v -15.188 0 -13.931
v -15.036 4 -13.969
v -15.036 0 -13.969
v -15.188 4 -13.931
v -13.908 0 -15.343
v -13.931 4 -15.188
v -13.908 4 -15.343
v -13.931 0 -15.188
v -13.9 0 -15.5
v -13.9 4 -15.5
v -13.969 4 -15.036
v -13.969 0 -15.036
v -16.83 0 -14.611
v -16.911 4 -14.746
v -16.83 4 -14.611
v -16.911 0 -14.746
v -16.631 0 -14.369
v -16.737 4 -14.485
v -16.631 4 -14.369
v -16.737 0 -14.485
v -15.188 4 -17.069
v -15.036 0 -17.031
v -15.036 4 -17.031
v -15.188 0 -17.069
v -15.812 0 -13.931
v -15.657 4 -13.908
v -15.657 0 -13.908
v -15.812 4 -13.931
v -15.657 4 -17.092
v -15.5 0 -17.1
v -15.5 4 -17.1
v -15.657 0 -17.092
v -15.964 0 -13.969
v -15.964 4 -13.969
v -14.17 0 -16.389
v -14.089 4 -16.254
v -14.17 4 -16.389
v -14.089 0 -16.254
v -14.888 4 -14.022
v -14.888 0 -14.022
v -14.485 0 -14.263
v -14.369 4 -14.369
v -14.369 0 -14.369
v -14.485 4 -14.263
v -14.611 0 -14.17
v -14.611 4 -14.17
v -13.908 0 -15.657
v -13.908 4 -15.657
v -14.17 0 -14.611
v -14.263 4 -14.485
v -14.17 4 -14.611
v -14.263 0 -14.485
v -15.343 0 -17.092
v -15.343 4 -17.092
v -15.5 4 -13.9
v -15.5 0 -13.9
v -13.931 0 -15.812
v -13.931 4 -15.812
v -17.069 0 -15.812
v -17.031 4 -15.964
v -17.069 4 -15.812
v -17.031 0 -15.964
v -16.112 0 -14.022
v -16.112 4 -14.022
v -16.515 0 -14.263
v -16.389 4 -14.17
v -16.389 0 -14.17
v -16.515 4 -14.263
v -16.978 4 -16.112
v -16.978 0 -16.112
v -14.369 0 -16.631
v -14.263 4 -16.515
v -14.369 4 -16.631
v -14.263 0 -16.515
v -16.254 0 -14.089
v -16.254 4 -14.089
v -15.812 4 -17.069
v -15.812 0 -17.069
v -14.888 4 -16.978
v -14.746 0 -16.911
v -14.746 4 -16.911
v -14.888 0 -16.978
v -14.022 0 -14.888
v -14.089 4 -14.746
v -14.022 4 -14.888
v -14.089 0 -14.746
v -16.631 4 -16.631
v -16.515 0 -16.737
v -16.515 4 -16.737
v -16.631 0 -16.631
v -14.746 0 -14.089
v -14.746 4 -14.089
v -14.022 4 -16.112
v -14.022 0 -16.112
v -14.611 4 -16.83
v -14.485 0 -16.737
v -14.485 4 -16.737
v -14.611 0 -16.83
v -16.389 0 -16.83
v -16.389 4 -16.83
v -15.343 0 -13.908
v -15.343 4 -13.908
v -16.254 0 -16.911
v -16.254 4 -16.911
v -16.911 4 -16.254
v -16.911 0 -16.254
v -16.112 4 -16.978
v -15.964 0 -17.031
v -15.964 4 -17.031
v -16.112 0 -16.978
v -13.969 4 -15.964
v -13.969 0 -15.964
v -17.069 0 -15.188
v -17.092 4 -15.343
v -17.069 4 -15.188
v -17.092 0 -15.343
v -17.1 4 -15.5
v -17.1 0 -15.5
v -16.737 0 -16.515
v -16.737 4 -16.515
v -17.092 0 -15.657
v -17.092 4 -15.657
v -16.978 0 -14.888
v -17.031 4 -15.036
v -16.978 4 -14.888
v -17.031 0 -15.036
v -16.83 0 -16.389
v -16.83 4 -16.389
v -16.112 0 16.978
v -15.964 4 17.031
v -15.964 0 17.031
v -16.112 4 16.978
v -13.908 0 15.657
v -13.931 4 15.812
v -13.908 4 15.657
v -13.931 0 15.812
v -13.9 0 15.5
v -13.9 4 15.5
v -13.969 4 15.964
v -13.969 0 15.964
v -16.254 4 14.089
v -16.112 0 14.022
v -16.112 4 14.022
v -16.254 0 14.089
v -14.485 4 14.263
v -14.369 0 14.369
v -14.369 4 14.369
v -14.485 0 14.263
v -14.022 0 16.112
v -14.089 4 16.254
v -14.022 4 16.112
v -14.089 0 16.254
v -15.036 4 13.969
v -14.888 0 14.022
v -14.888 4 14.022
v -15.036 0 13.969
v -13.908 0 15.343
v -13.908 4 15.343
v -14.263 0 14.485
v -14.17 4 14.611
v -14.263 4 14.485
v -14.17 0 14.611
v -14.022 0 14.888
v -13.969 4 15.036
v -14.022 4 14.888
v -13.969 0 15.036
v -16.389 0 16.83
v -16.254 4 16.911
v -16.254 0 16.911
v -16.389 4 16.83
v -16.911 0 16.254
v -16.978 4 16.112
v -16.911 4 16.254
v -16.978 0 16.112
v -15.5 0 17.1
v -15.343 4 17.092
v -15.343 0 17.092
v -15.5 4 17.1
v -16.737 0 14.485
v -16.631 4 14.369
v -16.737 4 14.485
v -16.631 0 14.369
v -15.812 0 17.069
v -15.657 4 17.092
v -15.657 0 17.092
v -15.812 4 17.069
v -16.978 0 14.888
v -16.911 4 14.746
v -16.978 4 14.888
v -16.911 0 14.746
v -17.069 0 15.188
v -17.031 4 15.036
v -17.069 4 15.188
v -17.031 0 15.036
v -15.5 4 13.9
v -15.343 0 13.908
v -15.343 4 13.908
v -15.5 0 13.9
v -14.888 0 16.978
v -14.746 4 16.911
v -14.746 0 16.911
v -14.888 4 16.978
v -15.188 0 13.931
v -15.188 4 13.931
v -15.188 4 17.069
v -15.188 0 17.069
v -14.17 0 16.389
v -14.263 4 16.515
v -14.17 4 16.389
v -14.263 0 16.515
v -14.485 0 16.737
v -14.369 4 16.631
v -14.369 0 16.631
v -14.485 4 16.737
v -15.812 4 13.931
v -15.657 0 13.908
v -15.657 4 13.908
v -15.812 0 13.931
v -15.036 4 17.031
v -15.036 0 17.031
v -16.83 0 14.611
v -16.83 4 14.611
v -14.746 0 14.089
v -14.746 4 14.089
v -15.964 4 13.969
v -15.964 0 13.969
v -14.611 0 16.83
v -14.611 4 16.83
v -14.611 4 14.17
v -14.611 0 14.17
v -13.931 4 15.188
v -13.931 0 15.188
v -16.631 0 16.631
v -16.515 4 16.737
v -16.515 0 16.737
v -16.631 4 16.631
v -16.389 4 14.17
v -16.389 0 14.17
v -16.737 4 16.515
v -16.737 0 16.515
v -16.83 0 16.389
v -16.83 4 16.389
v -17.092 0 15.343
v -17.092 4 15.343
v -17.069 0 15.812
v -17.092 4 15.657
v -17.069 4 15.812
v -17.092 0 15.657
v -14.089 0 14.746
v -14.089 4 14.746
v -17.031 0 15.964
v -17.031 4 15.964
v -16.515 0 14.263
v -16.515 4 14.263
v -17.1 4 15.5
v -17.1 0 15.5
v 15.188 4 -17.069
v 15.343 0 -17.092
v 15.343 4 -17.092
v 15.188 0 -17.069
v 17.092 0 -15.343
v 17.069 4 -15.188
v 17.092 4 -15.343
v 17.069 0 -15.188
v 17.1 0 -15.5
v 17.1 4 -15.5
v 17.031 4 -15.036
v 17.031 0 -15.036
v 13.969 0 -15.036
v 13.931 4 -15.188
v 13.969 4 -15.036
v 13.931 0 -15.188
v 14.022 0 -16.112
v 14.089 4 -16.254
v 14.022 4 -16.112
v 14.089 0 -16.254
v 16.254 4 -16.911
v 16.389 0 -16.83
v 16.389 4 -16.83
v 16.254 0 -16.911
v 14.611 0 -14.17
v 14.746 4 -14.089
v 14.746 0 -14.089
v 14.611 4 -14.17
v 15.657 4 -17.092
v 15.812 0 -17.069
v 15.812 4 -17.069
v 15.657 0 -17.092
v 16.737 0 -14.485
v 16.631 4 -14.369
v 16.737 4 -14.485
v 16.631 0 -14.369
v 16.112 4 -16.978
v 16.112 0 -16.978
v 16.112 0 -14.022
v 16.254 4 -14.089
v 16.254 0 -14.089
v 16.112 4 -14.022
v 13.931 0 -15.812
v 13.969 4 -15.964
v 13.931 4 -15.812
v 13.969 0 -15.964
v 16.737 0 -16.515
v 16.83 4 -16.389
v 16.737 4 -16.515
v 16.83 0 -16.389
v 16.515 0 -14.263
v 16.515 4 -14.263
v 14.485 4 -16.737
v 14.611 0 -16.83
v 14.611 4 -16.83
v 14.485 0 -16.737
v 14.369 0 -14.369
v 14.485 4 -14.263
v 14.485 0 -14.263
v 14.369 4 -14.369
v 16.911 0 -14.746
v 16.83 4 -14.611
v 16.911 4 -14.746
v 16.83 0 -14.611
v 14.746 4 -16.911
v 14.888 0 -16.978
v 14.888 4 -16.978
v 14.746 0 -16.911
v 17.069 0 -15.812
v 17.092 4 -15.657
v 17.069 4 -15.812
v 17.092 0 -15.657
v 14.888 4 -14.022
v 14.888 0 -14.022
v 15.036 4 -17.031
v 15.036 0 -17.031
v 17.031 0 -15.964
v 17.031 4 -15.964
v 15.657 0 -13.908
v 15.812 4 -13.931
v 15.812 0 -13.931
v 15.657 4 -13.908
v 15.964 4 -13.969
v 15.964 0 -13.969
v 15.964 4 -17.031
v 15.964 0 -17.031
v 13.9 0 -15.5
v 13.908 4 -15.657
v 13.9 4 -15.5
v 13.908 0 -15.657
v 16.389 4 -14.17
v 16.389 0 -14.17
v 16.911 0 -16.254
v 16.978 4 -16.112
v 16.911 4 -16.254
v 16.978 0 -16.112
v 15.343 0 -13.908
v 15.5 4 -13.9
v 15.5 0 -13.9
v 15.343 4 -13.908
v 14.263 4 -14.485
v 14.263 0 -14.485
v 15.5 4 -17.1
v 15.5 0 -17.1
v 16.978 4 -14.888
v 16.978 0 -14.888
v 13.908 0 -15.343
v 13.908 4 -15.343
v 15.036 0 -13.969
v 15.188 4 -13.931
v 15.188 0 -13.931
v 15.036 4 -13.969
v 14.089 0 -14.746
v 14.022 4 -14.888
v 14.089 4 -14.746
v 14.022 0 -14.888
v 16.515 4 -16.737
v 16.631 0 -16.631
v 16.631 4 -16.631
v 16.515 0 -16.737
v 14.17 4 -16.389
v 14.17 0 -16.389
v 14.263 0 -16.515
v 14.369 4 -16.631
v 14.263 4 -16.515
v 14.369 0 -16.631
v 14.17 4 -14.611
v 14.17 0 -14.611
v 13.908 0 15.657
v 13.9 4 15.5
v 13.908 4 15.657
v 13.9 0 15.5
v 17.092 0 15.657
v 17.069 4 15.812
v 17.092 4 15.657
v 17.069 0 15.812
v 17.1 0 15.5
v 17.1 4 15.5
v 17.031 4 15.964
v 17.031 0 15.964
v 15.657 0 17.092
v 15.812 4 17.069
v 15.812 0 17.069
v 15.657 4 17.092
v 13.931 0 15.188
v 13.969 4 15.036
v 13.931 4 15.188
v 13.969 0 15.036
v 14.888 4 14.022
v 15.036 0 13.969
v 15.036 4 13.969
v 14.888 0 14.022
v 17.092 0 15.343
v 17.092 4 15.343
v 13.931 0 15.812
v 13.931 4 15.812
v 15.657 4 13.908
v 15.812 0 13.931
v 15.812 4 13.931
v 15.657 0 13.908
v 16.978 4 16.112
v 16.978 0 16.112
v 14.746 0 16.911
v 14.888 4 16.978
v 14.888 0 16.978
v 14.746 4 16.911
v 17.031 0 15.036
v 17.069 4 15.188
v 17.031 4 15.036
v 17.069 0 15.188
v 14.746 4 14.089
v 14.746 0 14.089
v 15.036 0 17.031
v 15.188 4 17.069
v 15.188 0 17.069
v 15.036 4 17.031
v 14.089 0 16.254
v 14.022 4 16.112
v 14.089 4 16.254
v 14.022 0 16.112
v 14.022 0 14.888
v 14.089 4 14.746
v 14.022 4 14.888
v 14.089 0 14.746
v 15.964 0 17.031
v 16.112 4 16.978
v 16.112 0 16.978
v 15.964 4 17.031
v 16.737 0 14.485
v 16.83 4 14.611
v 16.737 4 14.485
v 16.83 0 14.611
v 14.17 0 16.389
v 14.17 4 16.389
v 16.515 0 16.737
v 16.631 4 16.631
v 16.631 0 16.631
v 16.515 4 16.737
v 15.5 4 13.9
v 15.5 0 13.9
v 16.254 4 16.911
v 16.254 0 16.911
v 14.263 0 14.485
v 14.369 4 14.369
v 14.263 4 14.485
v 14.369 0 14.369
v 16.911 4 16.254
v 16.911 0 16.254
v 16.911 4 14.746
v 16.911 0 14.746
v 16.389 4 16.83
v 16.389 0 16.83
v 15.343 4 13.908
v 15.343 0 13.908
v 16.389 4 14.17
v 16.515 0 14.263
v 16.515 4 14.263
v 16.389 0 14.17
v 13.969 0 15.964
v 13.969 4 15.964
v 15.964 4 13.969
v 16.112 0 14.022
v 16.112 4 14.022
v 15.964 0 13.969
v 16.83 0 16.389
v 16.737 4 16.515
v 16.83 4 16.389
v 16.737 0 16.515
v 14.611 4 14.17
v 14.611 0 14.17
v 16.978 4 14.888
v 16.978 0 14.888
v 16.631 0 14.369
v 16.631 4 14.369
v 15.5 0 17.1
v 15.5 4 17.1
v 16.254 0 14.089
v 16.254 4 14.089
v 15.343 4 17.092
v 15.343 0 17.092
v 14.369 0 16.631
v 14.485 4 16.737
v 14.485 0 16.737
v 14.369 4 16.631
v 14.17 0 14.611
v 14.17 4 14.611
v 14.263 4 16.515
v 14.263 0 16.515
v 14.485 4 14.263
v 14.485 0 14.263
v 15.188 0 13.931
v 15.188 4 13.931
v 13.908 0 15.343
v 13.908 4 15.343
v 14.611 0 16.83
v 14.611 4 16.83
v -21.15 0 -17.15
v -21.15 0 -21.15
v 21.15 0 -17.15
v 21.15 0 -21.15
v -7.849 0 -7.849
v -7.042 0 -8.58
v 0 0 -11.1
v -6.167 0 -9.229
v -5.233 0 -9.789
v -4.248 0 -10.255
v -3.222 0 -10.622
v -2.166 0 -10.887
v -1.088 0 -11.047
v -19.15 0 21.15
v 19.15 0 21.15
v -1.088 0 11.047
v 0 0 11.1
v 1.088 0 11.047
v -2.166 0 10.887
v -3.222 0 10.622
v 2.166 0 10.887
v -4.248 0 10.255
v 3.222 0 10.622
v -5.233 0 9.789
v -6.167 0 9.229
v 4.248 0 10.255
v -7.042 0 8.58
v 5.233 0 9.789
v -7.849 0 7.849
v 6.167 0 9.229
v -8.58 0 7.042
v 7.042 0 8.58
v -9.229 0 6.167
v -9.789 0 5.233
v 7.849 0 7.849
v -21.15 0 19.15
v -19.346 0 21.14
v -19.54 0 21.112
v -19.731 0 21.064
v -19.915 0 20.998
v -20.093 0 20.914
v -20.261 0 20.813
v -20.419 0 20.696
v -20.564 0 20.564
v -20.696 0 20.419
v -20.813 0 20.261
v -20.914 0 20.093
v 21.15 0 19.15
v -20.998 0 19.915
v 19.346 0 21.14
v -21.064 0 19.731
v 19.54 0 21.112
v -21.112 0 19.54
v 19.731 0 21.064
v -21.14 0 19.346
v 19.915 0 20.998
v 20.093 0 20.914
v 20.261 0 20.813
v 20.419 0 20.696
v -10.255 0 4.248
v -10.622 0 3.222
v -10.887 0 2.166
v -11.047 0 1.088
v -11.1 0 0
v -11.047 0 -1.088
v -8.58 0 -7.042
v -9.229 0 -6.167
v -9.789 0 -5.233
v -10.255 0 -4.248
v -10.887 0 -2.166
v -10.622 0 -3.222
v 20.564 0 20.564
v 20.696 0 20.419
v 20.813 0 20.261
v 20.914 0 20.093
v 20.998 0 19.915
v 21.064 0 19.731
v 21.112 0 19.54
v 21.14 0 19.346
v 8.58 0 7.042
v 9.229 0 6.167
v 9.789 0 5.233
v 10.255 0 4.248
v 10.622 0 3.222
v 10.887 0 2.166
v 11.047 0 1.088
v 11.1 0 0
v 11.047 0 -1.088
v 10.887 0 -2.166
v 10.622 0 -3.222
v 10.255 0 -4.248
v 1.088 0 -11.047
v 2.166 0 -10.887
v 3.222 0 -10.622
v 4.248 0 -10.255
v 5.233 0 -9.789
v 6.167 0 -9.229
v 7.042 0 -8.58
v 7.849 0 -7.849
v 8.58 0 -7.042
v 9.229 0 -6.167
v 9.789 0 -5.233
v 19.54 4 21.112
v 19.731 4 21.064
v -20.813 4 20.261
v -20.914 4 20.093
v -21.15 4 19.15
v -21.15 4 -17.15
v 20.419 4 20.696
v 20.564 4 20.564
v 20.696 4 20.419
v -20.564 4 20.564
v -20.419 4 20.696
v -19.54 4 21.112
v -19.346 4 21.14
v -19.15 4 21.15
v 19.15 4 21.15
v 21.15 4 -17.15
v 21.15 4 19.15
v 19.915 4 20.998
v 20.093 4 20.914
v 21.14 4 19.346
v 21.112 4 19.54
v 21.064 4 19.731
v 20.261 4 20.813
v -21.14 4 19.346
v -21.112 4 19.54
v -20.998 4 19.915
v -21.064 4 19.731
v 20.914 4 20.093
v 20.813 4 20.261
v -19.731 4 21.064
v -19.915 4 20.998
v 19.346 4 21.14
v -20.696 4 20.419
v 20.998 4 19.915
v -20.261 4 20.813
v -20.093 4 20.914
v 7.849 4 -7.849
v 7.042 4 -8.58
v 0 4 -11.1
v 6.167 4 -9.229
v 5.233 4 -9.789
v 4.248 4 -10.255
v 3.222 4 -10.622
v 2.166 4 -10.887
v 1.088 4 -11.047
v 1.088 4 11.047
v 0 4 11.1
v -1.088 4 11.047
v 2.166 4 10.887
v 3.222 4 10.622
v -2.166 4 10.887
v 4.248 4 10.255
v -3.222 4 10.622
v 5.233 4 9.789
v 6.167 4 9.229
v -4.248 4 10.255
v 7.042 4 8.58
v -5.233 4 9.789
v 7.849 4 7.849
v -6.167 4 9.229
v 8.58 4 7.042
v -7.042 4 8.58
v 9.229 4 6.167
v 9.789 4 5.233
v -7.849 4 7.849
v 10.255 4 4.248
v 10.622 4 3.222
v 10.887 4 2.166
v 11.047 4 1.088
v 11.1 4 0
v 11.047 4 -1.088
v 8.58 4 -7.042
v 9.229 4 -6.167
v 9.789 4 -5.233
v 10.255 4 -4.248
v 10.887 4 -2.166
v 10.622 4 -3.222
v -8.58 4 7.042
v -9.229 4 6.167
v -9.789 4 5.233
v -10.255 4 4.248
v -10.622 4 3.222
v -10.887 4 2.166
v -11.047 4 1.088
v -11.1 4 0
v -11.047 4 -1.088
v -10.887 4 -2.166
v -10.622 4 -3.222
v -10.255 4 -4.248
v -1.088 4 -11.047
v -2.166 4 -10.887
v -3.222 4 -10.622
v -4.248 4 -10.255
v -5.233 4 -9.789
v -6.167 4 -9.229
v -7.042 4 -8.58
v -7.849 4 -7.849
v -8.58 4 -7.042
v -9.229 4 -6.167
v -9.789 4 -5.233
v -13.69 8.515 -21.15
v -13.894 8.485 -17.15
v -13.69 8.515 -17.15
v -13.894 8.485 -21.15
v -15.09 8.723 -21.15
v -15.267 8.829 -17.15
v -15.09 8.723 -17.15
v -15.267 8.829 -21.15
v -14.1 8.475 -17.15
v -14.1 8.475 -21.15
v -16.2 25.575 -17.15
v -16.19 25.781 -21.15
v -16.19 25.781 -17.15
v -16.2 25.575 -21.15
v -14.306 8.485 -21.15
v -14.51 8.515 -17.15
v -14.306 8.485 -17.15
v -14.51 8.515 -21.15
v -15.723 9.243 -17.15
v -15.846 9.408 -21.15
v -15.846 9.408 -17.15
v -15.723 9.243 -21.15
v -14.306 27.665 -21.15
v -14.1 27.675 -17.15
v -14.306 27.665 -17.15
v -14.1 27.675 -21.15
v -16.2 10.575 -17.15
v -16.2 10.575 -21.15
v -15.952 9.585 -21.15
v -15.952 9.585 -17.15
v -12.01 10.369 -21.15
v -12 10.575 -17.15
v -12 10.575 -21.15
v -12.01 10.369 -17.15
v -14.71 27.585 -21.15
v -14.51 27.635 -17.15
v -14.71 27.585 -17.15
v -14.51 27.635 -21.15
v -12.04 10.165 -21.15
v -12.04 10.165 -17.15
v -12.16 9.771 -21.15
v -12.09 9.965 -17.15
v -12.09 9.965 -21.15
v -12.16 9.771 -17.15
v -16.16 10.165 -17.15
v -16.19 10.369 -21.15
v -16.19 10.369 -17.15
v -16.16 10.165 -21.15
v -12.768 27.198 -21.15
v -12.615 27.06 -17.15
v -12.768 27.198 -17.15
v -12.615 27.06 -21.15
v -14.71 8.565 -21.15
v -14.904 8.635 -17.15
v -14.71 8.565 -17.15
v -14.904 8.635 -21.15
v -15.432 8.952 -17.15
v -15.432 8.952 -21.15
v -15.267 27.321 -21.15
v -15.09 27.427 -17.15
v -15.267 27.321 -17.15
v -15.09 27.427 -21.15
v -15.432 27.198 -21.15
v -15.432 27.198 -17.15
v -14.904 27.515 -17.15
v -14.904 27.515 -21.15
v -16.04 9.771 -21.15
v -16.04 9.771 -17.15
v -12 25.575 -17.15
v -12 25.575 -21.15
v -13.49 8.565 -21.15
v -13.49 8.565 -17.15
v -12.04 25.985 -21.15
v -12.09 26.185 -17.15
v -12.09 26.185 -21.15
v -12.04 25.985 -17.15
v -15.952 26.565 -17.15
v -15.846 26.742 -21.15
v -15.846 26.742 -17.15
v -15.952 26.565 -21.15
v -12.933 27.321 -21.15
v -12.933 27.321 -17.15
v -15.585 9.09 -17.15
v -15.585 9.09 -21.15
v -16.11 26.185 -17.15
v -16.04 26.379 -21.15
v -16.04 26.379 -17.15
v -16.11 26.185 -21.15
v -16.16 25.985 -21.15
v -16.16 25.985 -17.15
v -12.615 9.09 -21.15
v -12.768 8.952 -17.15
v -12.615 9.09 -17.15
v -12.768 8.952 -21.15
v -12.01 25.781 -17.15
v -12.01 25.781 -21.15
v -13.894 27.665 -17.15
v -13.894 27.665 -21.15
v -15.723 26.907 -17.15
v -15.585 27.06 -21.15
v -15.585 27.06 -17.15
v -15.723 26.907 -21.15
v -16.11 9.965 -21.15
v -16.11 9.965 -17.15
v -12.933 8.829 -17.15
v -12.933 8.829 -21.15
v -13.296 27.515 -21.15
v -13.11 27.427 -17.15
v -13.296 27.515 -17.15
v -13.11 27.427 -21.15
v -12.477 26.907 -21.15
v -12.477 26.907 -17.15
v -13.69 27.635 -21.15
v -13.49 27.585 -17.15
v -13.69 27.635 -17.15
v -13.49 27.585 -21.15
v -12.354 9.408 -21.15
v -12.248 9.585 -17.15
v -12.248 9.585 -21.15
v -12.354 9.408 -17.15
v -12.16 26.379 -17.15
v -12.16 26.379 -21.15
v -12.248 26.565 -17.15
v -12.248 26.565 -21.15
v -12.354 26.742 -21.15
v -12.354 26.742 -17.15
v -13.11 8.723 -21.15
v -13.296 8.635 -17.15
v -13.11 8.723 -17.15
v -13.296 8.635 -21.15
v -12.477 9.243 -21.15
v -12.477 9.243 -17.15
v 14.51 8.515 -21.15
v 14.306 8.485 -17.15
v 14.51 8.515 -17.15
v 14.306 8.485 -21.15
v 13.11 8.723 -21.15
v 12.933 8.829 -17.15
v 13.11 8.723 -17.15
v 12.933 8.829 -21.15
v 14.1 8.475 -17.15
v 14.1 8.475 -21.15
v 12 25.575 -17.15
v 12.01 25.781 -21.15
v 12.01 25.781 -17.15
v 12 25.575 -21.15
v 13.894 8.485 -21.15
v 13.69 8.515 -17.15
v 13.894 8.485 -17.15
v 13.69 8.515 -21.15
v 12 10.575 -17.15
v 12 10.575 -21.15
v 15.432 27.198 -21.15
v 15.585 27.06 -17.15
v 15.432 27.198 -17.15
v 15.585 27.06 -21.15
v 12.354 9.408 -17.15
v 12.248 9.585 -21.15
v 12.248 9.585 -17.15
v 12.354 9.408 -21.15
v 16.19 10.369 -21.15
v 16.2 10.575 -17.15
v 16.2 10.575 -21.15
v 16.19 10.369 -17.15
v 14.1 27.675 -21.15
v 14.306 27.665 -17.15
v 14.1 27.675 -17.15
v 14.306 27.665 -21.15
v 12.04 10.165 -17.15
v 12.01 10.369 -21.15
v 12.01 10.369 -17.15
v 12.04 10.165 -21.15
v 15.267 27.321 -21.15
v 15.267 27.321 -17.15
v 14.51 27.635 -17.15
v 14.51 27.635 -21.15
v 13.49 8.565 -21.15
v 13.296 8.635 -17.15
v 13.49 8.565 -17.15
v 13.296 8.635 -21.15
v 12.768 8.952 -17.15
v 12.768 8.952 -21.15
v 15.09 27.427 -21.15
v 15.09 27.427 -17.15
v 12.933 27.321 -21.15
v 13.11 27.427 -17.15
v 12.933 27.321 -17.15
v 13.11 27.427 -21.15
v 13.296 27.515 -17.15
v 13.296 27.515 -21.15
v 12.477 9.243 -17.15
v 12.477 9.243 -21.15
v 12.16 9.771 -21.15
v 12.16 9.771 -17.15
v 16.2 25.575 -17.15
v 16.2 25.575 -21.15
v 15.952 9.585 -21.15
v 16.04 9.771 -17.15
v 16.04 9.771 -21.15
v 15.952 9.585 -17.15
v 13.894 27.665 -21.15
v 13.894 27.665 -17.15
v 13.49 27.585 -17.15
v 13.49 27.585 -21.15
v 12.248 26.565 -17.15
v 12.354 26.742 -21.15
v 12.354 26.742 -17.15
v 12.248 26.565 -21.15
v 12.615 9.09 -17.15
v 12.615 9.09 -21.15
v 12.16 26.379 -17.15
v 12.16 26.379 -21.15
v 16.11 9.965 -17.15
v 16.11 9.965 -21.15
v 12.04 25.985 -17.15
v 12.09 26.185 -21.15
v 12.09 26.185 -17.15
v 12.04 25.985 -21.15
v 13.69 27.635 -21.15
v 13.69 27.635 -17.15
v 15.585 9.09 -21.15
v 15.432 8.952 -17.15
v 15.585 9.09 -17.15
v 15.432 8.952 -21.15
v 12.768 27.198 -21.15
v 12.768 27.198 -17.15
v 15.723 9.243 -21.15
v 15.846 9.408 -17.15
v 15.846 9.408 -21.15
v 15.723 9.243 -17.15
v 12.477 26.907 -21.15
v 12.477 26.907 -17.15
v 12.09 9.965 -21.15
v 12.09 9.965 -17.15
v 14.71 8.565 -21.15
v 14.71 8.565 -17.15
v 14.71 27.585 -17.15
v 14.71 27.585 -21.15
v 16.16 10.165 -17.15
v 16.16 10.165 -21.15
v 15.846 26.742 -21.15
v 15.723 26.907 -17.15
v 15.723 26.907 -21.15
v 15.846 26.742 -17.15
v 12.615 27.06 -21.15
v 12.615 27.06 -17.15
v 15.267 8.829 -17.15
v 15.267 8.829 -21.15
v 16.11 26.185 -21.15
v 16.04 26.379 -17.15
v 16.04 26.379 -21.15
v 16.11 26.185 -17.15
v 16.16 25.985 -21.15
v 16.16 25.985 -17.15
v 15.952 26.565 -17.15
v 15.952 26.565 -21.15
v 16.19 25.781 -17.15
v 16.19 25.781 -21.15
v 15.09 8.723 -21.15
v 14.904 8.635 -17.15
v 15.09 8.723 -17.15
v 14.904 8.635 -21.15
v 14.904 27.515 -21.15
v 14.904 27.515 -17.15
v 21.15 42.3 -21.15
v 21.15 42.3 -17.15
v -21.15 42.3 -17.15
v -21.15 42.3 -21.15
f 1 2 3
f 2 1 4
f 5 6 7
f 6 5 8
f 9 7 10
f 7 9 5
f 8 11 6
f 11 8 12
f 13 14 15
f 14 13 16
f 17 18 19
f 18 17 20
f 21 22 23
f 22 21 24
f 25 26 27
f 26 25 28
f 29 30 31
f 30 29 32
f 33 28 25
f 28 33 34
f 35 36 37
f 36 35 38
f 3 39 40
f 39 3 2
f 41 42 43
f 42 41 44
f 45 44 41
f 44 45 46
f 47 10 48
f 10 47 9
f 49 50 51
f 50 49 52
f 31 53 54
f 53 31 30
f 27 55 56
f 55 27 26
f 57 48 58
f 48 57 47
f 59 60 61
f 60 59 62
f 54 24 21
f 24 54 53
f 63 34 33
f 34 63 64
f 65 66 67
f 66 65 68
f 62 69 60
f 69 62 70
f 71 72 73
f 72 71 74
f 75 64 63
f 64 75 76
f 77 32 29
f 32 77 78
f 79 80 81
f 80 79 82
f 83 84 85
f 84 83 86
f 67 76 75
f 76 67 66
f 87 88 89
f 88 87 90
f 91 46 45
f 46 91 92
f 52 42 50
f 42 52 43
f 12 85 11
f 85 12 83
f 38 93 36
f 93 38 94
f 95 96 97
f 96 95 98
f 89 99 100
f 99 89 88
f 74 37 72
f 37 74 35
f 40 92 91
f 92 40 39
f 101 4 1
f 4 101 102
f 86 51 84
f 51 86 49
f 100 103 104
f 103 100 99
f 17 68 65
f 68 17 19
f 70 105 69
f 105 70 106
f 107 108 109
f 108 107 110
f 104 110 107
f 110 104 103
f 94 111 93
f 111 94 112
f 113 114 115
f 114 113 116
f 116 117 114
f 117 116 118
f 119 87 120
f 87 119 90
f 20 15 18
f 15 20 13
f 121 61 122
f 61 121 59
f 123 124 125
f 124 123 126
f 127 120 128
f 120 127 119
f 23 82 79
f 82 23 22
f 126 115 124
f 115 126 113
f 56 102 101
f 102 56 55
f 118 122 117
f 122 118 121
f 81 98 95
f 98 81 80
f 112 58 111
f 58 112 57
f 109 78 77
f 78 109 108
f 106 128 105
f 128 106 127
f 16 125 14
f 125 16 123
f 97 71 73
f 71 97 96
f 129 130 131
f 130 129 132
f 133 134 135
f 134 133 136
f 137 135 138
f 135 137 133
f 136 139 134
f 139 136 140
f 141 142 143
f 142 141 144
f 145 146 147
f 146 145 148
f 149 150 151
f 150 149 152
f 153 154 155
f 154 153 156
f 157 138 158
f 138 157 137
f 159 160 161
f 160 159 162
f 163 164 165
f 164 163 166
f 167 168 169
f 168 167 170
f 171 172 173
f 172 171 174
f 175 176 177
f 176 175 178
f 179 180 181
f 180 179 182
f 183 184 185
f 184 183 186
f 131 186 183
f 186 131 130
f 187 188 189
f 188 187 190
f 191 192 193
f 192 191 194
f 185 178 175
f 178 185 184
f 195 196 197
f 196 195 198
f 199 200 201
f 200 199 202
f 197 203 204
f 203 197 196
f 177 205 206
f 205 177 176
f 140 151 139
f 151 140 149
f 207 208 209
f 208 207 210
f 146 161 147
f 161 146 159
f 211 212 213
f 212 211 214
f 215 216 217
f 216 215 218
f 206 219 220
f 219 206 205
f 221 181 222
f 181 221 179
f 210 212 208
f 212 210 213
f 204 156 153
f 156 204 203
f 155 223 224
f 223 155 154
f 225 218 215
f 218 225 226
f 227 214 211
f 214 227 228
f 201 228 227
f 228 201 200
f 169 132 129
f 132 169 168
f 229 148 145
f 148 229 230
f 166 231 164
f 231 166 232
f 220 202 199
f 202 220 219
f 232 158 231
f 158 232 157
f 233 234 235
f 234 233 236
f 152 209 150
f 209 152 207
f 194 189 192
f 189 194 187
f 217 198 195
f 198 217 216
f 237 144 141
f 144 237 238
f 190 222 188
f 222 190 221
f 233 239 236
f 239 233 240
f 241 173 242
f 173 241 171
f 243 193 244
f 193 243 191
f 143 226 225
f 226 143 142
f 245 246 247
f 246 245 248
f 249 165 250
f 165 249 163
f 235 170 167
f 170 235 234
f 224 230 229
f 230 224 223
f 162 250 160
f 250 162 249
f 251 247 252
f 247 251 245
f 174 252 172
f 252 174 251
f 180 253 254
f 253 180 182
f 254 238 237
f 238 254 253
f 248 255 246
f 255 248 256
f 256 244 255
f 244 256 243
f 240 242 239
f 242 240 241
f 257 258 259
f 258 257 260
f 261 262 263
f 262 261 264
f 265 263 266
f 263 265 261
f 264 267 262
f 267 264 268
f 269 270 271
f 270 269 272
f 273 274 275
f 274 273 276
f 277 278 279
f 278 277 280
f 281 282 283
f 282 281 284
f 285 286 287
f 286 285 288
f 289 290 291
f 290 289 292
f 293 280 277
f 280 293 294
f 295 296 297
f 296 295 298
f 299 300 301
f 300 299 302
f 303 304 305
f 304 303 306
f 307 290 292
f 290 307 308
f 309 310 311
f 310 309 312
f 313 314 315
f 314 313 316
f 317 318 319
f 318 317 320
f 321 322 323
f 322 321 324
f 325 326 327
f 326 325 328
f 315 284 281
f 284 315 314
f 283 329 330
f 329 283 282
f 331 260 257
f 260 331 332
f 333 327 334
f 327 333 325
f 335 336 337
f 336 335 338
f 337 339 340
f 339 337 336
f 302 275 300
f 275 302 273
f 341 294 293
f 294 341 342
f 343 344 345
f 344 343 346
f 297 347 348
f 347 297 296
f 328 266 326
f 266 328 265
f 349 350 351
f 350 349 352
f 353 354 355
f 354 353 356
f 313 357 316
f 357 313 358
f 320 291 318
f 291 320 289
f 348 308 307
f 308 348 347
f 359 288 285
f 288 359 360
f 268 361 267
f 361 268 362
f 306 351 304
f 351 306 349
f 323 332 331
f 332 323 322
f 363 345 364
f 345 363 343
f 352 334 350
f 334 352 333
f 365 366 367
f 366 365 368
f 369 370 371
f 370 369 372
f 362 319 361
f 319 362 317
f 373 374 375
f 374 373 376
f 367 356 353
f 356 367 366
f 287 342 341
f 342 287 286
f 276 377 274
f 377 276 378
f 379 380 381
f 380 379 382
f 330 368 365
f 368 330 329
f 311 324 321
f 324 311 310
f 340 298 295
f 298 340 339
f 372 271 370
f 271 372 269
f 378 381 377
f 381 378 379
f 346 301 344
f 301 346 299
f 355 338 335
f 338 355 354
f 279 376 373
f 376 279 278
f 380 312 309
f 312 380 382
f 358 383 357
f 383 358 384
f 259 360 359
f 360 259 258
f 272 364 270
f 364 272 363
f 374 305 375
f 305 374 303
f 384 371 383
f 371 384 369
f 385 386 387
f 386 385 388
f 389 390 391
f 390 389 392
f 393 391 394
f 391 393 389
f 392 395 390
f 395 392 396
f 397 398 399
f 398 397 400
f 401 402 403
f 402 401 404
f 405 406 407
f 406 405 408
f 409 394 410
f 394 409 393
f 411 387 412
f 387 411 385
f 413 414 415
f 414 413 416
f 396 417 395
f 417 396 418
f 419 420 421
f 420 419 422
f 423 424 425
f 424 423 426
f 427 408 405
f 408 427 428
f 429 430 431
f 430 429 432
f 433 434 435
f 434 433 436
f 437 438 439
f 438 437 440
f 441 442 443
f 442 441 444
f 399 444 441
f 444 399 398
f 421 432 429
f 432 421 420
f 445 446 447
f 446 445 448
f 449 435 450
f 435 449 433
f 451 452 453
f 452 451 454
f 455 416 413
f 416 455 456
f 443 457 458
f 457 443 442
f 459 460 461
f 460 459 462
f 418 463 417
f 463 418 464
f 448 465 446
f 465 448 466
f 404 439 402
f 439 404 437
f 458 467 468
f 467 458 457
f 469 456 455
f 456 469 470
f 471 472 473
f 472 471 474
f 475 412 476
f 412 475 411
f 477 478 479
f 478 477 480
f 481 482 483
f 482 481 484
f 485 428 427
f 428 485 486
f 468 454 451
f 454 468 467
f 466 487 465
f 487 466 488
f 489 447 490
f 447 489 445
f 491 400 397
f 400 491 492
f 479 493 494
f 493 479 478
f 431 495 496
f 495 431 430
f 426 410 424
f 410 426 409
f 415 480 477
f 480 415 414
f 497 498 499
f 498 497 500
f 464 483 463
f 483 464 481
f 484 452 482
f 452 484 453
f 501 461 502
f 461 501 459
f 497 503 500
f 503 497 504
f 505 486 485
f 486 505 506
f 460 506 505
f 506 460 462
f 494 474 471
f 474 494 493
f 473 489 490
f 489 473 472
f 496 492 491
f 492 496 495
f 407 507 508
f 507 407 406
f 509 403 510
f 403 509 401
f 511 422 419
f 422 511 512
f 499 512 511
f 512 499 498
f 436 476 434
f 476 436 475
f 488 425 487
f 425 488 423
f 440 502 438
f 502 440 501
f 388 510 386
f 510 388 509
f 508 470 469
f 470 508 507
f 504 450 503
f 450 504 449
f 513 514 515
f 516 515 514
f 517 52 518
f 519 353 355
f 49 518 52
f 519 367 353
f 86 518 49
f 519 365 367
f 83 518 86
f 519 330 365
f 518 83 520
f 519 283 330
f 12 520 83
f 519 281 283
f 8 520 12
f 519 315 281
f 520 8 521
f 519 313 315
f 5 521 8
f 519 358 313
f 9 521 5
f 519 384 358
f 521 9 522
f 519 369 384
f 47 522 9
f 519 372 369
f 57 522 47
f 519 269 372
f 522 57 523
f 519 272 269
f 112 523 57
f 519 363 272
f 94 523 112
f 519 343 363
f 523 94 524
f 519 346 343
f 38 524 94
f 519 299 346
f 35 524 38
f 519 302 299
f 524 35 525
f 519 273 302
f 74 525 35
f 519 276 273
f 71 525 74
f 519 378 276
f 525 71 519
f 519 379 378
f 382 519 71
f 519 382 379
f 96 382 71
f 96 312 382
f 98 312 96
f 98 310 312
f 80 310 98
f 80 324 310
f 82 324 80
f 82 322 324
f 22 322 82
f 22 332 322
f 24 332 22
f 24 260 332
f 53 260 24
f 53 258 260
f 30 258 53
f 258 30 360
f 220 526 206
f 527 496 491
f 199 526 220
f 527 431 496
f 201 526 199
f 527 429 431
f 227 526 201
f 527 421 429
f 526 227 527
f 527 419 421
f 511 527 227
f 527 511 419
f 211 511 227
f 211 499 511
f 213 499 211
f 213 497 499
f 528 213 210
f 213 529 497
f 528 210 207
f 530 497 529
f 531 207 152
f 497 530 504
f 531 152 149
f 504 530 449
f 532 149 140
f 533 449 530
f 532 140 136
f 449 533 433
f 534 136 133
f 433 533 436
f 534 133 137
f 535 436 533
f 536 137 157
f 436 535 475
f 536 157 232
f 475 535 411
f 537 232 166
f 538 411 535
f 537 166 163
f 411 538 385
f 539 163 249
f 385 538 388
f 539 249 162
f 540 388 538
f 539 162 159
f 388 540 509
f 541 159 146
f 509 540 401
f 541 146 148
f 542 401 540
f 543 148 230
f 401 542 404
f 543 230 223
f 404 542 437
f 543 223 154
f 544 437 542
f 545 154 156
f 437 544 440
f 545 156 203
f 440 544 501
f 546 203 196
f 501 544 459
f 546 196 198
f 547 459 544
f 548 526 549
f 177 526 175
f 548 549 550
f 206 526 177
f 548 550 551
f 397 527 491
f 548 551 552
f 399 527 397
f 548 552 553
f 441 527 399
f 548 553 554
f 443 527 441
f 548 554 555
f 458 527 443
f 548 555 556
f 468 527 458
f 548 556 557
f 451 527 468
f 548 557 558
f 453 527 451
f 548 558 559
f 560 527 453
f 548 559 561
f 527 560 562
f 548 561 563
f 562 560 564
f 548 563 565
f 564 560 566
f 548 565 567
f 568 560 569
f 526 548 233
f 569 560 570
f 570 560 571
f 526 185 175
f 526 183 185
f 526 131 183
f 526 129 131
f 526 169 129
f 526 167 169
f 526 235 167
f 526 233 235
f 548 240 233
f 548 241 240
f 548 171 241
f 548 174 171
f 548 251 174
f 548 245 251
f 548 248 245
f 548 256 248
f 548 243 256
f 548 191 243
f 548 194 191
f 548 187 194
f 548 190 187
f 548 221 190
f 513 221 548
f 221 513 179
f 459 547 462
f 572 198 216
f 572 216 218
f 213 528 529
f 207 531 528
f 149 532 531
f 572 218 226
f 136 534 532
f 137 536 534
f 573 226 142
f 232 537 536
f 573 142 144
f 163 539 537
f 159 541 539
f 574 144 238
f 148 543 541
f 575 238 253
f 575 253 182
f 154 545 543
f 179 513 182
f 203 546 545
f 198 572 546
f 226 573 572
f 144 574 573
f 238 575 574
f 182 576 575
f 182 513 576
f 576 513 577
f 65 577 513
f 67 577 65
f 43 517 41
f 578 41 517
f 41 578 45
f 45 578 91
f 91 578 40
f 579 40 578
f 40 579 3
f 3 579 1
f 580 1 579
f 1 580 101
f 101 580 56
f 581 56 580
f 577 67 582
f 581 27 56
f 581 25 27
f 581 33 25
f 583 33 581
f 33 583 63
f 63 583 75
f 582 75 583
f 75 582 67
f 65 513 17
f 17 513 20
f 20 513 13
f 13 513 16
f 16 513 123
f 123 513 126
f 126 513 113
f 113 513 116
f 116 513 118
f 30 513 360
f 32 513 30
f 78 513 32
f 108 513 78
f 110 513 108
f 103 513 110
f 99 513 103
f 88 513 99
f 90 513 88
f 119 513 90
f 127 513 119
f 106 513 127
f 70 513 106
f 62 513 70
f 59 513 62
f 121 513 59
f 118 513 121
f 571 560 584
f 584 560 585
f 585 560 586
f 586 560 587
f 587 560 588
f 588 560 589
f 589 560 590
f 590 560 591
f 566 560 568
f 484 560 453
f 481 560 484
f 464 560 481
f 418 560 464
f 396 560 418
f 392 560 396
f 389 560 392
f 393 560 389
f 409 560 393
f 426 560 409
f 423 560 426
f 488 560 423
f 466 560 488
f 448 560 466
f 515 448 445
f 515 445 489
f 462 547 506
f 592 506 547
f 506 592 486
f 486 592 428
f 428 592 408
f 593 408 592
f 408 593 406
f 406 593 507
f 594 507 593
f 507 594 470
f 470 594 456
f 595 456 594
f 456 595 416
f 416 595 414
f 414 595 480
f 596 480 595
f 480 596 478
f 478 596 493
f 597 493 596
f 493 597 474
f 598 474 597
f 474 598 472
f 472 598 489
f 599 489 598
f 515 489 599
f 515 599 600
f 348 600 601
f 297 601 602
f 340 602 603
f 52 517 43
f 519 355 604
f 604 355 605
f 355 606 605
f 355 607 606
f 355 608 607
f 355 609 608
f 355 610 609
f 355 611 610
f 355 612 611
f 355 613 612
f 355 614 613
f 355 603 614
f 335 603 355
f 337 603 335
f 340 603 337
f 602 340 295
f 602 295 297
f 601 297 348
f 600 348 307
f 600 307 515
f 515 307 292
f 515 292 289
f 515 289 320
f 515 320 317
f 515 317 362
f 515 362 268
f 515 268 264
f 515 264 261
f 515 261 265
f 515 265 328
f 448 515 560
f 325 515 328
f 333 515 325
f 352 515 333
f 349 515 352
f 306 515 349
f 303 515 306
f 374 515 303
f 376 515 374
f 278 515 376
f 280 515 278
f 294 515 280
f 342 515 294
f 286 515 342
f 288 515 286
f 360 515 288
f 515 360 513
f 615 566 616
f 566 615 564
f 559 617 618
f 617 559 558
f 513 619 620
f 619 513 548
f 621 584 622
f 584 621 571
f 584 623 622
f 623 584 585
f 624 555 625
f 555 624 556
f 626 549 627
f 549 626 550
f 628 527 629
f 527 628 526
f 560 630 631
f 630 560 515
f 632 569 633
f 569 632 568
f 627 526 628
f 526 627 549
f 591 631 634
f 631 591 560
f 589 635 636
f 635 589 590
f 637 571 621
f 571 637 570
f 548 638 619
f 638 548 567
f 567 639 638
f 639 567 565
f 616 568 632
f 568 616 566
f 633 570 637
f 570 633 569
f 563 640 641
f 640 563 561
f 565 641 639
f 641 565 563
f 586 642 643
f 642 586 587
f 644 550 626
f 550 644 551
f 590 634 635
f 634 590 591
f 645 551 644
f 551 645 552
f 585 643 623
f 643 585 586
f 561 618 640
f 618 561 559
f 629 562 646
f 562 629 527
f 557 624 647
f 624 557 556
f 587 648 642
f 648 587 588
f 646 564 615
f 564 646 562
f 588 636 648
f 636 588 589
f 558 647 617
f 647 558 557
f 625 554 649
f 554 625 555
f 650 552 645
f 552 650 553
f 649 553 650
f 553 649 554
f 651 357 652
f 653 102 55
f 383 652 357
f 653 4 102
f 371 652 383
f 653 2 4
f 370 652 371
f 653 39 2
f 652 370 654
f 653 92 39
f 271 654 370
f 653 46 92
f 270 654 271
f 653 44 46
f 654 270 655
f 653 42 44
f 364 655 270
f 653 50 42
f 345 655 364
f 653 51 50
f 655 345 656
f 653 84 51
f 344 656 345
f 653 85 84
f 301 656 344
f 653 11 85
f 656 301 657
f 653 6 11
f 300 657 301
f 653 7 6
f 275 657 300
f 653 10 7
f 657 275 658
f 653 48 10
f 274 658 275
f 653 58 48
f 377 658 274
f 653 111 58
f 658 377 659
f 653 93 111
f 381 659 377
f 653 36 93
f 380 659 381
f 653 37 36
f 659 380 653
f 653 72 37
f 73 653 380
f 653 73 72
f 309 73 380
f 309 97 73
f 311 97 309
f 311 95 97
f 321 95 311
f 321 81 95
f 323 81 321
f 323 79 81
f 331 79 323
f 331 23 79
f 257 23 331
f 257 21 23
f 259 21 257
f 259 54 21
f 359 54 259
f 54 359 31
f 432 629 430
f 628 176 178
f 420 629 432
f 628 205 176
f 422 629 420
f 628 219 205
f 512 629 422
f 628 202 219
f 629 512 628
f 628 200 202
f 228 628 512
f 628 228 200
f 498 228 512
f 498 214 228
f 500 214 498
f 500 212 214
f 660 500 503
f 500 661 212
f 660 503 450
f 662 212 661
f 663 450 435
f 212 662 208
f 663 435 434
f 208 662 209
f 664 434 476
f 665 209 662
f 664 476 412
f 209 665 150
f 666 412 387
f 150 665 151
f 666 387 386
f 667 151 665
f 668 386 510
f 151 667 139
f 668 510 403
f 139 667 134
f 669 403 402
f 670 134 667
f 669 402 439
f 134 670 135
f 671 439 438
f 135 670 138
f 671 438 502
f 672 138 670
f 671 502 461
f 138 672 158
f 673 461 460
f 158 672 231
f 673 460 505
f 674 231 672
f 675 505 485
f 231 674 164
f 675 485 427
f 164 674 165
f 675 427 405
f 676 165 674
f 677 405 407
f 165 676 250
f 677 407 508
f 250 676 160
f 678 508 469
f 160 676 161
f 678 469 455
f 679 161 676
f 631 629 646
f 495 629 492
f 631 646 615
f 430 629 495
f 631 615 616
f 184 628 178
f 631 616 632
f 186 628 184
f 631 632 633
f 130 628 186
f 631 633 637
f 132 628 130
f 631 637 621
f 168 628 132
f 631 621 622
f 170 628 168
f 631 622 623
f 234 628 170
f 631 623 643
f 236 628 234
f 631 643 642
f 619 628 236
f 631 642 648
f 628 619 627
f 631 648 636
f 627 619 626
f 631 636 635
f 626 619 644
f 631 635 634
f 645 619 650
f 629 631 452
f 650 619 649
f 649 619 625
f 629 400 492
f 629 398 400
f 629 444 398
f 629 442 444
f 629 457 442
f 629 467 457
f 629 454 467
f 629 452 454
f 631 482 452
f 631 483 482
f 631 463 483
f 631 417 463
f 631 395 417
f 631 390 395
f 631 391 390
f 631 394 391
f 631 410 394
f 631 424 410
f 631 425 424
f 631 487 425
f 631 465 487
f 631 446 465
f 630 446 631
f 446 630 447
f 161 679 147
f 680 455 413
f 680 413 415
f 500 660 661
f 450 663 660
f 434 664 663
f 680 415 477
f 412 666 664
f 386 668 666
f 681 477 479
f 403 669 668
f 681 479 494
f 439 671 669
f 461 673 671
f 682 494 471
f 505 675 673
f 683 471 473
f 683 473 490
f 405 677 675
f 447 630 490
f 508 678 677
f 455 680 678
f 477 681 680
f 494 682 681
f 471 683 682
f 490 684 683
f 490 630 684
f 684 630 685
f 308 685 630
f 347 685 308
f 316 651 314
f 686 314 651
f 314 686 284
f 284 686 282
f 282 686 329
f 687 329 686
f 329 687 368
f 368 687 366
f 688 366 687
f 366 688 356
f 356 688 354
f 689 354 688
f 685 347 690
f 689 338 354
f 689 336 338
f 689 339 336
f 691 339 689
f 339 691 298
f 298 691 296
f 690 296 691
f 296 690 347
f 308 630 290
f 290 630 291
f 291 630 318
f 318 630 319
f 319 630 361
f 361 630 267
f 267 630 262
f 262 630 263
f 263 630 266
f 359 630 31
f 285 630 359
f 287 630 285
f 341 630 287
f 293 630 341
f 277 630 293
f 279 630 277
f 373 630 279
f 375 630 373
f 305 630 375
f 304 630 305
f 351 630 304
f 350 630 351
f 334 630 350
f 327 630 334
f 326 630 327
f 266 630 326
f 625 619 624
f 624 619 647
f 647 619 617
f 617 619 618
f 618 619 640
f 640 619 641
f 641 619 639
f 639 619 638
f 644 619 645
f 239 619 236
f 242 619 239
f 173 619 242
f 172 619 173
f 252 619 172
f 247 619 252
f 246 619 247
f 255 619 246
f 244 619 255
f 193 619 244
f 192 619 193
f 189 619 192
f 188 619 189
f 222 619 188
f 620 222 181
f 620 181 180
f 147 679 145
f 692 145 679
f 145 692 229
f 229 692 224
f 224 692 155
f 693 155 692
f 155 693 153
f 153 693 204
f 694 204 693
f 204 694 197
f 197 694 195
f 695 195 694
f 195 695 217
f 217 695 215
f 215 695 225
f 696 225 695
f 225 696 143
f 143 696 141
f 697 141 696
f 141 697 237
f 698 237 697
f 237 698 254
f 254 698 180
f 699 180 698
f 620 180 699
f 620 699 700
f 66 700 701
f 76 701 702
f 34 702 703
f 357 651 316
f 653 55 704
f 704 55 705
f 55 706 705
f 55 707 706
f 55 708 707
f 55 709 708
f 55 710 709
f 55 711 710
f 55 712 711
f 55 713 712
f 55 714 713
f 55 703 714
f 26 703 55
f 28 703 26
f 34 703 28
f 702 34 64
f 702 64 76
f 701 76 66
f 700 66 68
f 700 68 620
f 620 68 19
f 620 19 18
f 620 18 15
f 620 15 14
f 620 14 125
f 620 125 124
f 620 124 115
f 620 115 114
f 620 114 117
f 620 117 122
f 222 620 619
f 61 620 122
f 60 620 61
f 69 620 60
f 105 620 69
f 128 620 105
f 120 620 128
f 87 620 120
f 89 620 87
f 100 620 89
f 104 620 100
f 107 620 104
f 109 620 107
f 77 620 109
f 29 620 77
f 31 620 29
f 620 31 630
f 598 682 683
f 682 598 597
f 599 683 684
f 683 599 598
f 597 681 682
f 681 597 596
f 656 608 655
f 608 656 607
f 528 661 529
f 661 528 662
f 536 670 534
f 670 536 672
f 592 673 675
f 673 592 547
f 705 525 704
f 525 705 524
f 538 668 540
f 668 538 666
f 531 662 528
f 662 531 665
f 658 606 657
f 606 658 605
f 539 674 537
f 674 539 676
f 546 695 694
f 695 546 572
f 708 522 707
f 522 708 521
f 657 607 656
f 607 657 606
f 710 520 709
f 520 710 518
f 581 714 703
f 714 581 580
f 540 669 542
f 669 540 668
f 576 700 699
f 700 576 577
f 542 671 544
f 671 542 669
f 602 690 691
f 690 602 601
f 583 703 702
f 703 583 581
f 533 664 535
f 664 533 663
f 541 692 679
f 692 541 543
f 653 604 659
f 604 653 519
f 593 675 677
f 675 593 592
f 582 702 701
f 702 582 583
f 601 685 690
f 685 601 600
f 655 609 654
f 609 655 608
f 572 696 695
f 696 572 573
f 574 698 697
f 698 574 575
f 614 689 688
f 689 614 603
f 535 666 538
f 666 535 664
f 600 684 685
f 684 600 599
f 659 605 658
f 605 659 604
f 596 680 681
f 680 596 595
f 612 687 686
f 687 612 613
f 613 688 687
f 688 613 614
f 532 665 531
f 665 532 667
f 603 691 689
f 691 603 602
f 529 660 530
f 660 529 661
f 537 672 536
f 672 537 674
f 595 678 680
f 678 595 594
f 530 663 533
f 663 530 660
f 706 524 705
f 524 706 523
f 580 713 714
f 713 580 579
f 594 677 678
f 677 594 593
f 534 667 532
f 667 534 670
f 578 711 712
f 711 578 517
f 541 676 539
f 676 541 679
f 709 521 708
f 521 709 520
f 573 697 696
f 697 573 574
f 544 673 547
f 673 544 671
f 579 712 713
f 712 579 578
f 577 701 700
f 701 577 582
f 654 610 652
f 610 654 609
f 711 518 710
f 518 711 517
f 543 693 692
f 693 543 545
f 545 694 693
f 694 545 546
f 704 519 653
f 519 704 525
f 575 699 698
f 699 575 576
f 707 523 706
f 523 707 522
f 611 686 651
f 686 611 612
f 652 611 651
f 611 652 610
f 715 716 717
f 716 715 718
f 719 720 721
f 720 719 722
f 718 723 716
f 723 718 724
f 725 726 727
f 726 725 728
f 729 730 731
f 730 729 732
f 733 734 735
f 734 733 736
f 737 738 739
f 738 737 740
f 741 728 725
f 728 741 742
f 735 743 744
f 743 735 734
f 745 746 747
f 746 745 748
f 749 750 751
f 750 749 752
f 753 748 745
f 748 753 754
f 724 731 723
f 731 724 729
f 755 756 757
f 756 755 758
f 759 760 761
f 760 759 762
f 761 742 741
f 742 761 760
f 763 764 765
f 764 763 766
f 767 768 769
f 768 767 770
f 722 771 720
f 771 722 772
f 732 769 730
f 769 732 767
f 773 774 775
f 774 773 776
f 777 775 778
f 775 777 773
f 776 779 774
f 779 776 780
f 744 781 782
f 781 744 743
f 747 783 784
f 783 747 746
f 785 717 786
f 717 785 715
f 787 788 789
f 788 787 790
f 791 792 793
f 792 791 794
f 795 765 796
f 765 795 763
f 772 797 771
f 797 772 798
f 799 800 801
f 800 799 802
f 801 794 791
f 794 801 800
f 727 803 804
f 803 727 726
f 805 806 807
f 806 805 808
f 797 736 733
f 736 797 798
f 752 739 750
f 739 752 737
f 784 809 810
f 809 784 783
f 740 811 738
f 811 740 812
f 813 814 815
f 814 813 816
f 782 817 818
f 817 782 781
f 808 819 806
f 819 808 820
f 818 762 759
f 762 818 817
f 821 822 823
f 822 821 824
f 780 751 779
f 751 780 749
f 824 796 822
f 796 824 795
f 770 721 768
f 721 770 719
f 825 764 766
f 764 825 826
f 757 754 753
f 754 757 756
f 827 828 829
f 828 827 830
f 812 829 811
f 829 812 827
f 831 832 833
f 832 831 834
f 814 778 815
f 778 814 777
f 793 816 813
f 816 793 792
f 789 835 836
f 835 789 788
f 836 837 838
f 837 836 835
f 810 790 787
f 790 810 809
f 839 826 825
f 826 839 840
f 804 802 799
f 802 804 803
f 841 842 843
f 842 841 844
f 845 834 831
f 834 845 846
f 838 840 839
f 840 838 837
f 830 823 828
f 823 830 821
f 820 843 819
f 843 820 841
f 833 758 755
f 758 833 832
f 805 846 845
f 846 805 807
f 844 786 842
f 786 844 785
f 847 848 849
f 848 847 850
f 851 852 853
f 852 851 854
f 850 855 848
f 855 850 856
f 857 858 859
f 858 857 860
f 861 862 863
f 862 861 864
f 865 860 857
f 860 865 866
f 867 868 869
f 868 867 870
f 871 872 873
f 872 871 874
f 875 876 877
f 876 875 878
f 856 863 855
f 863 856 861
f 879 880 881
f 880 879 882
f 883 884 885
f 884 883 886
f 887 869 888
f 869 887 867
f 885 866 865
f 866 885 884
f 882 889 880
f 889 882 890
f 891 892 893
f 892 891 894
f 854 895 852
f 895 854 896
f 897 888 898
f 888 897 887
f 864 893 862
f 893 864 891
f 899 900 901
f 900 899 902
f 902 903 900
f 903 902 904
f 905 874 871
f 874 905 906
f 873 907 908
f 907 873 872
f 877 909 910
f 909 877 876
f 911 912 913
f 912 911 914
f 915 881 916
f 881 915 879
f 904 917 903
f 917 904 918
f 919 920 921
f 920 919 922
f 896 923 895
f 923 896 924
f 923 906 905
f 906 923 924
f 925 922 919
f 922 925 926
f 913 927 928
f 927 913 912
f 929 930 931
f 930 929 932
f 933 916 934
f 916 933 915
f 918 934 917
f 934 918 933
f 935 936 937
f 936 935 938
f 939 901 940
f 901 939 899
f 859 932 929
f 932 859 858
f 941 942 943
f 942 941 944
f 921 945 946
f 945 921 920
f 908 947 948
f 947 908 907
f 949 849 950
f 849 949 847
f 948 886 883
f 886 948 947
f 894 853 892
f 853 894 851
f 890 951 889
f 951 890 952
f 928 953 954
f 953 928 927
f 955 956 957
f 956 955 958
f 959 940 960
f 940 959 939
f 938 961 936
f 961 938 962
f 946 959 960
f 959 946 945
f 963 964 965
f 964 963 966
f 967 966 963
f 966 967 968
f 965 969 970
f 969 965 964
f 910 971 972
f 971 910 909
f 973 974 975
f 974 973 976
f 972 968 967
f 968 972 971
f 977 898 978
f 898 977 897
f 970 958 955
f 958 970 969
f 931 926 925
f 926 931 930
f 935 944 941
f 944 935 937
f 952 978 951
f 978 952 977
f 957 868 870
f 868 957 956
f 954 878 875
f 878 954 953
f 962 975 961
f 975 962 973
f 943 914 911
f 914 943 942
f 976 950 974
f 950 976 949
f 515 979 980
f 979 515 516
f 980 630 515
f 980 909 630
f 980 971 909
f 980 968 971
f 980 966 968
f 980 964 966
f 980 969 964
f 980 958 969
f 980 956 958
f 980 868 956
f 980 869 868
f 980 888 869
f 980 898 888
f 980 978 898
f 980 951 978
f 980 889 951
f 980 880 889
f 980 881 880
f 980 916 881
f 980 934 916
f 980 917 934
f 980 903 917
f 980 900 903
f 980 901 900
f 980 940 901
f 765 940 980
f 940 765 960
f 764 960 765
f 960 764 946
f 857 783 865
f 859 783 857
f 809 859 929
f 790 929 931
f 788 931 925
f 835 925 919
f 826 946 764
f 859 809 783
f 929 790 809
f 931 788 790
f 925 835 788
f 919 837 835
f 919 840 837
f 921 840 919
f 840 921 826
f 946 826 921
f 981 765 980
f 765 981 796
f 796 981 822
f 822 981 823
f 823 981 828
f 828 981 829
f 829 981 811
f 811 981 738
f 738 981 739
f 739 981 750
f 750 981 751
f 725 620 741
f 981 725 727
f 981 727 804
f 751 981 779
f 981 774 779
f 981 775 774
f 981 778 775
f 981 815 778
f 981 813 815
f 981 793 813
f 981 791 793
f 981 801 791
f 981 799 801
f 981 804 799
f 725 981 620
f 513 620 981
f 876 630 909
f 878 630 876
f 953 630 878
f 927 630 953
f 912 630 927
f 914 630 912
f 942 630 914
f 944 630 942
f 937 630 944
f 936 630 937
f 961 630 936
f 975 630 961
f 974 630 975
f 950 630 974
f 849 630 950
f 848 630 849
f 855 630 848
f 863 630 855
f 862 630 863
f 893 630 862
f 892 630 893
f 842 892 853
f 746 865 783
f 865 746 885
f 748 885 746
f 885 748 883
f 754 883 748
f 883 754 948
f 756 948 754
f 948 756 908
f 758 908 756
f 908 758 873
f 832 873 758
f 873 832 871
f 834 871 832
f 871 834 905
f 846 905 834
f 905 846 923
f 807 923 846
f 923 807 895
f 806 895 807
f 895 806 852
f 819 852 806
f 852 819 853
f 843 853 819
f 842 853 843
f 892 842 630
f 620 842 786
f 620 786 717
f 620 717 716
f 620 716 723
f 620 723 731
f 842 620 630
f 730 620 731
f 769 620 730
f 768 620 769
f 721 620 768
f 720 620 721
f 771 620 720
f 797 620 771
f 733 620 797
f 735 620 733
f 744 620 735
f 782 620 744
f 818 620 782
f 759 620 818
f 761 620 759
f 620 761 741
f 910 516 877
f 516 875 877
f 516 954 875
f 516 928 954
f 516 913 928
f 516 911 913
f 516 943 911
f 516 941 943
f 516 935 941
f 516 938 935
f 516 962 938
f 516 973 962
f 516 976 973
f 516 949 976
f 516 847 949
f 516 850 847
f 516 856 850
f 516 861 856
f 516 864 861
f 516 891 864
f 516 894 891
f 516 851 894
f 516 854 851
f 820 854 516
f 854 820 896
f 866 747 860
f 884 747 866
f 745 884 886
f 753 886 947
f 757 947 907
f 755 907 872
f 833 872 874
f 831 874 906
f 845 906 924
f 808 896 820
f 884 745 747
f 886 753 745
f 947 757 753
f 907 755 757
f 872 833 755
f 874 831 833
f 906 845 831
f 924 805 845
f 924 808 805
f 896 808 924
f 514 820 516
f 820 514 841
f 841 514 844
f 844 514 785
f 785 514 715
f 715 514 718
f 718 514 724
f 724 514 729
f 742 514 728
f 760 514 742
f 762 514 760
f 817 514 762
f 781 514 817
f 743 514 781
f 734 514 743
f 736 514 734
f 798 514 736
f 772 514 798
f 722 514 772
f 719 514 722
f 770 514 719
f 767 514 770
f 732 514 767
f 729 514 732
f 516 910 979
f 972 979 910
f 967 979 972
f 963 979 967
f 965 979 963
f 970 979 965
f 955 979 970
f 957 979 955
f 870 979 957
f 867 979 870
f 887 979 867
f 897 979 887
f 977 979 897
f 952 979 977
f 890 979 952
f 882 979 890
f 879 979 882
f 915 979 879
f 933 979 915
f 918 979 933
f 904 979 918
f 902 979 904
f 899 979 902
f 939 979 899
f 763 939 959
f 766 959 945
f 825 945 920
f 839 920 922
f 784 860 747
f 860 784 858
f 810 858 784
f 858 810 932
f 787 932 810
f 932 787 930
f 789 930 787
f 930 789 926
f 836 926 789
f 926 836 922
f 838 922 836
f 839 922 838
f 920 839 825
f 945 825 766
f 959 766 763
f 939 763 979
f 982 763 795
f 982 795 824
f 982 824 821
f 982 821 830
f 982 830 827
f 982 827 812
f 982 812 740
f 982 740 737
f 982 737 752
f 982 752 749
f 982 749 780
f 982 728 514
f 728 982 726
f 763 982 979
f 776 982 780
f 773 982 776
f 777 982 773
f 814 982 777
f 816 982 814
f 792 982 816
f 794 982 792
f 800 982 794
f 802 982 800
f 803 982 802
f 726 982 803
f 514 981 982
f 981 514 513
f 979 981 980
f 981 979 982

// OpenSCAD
/* ==================================================================
   Project: Parametric NEMA Motor Mount with Belt Tensioner
   Description: End-to-end parametric design for a motor bracket.
   Author: 
   ================================================================== */

// --- 1. PARAMETERS (Technical Specifications) ---
nema_type = 17;          // [14, 17, 23] Select NEMA motor standard
thickness = 4.0;         // Bracket wall thickness (mm)
travel_dist = 15.0;      // Sliding distance for belt tensioning (mm)
tolerance = 0.2;         // 3D printing clearance/tolerance (mm)
$fn = 64;                // Curve resolution

// --- 2. DATA LOOKUP (Logic & Constants) ---
// Functions to retrieve dimensions based on NEMA standards
function get_nema_width(type) = (type == 23) ? 56.4 : ((type == 17) ? 42.3 : 35.2);
function get_hole_spacing(type) = (type == 23) ? 47.1 : ((type == 17) ? 31.0 : 26.0);
function get_center_hole(type) = (type == 23) ? 38.1 : ((type == 17) ? 22.0 : 22.0);
function get_screw_dia(type) = (type == 23) ? 5.0 : 3.0; // M5 for NEMA23, M3 for 14/17

// --- 3. REUSABLE MODULES ---
/**
 * @brief Generates a 2D slotted hole using hull() for geometric accuracy
 * @param dia: Diameter of the hole
 * @param travel: Length of the slot
 */
module slotted_hole_2d(dia, travel) {
    hull() {
        circle(d=dia);
        translate([travel, 0]) circle(d=dia);
    }
}

// --- 4. MAIN CSG & EXTRUSION ---
module nema_mount() {
    w = get_nema_width(nema_type);
    spacing = get_hole_spacing(nema_type);
    center_d = get_center_hole(nema_type) + tolerance;
    screw_d = get_screw_dia(nema_type) + tolerance;
    
    // Motor Mounting Flange (Vertical Face)
    translate([0, thickness, 0]) rotate([90, 0, 0])
    difference() {
        // 2D to 3D Extrusion
        linear_extrude(thickness)
        offset(r=2) offset(delta=-2) // 2D rounding technique for stress reduction
        square([w, w], center=true);
        
        // Center bore and 4 mounting holes
        translate([0, 0, -1]) cylinder(h=thickness+2, d=center_d);
        for(x = [-1, 1], y = [-1, 1]) {
            translate([x * spacing/2, y * spacing/2, -1])
            cylinder(h=thickness+2, d=screw_d);
        }
    }

    // Base Mounting Flange (Horizontal Face)
    translate([0, 0, -w/2])
    difference() {
        translate([-w/2, 0, 0]) cube([w, w, thickness]);
        
        // Belt tensioner slots
        for(x = [-w/3, w/3]) {
            translate([x, w/4, -1])
            linear_extrude(thickness + 2)
            rotate([0,0,90])
            slotted_hole_2d(dia=screw_d+1, travel=travel_dist);
        }
    }
}

// Render execution
nema_mount();
